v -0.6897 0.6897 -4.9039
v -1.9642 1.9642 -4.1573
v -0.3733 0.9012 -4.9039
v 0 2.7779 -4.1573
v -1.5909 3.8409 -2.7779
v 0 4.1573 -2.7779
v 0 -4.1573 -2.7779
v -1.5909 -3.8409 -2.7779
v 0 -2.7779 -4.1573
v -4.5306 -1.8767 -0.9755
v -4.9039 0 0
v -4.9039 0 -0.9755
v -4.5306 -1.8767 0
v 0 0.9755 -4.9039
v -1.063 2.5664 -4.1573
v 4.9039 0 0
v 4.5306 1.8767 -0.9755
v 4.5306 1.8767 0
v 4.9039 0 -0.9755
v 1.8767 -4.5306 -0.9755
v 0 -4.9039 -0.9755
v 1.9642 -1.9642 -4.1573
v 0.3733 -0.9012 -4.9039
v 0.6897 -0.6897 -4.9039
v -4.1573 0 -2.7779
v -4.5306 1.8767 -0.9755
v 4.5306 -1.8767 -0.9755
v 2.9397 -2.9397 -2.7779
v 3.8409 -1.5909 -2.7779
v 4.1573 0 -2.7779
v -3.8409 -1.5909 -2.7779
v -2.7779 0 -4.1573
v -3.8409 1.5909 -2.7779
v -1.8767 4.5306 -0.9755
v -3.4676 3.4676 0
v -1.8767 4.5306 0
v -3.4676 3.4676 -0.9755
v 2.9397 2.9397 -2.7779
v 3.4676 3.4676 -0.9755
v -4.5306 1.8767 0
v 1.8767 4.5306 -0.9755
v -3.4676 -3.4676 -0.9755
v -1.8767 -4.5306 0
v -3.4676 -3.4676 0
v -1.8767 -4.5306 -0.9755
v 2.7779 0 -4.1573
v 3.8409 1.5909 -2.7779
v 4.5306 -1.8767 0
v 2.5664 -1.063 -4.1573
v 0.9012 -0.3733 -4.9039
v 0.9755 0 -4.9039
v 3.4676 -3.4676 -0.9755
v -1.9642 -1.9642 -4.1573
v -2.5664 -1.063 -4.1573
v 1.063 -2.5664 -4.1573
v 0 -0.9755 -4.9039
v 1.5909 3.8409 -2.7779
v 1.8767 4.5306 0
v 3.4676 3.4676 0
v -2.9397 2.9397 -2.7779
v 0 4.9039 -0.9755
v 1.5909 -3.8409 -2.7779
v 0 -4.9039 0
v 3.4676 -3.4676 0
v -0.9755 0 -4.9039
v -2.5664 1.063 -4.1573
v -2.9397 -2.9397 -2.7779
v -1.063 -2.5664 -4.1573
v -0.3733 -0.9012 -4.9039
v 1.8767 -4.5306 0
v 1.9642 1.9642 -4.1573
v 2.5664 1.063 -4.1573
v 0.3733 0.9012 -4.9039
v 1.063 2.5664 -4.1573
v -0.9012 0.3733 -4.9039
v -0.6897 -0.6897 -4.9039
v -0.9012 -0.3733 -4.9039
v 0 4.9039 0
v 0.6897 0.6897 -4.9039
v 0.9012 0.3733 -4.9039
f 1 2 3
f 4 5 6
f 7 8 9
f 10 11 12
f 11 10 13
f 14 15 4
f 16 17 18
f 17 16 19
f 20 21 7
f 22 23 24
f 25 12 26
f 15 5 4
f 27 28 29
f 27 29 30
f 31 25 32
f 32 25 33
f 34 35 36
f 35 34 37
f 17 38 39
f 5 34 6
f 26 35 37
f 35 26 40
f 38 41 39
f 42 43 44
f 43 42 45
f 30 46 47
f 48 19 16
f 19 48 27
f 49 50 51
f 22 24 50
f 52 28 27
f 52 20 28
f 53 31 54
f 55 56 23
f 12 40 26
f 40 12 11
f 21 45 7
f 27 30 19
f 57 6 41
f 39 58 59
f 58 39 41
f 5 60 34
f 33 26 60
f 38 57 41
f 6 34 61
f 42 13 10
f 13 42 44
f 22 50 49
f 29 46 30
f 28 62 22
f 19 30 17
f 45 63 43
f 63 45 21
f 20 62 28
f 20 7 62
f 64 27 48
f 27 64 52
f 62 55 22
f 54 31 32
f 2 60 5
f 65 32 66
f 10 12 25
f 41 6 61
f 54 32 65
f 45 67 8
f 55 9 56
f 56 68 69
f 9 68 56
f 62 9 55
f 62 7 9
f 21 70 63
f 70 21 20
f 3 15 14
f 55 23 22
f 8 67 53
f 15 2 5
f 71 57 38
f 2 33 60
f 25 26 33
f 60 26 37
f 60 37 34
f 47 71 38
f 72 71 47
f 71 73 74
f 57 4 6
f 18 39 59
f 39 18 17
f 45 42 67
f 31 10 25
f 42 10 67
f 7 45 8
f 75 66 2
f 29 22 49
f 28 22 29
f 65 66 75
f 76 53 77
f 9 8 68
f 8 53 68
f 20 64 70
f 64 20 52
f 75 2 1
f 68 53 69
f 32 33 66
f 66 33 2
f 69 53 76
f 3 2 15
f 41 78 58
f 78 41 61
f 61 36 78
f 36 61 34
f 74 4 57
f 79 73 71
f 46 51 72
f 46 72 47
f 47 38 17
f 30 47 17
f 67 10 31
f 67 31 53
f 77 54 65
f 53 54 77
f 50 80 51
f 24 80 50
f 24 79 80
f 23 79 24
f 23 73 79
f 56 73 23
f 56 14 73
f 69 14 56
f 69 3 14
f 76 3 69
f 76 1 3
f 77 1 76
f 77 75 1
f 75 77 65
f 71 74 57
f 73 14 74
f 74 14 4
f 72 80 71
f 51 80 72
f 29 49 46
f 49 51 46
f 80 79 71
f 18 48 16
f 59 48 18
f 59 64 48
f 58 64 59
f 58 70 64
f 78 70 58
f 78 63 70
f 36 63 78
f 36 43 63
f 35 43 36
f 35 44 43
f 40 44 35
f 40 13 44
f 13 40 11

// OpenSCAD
hemisphere(5);

//Creates a hemisphere of the specified radius.
module hemisphere(radius)
{
    difference()
    {
        sphere(r=radius);
        cylinder(r1=radius, r2=radius, h=radius);
    }
}
